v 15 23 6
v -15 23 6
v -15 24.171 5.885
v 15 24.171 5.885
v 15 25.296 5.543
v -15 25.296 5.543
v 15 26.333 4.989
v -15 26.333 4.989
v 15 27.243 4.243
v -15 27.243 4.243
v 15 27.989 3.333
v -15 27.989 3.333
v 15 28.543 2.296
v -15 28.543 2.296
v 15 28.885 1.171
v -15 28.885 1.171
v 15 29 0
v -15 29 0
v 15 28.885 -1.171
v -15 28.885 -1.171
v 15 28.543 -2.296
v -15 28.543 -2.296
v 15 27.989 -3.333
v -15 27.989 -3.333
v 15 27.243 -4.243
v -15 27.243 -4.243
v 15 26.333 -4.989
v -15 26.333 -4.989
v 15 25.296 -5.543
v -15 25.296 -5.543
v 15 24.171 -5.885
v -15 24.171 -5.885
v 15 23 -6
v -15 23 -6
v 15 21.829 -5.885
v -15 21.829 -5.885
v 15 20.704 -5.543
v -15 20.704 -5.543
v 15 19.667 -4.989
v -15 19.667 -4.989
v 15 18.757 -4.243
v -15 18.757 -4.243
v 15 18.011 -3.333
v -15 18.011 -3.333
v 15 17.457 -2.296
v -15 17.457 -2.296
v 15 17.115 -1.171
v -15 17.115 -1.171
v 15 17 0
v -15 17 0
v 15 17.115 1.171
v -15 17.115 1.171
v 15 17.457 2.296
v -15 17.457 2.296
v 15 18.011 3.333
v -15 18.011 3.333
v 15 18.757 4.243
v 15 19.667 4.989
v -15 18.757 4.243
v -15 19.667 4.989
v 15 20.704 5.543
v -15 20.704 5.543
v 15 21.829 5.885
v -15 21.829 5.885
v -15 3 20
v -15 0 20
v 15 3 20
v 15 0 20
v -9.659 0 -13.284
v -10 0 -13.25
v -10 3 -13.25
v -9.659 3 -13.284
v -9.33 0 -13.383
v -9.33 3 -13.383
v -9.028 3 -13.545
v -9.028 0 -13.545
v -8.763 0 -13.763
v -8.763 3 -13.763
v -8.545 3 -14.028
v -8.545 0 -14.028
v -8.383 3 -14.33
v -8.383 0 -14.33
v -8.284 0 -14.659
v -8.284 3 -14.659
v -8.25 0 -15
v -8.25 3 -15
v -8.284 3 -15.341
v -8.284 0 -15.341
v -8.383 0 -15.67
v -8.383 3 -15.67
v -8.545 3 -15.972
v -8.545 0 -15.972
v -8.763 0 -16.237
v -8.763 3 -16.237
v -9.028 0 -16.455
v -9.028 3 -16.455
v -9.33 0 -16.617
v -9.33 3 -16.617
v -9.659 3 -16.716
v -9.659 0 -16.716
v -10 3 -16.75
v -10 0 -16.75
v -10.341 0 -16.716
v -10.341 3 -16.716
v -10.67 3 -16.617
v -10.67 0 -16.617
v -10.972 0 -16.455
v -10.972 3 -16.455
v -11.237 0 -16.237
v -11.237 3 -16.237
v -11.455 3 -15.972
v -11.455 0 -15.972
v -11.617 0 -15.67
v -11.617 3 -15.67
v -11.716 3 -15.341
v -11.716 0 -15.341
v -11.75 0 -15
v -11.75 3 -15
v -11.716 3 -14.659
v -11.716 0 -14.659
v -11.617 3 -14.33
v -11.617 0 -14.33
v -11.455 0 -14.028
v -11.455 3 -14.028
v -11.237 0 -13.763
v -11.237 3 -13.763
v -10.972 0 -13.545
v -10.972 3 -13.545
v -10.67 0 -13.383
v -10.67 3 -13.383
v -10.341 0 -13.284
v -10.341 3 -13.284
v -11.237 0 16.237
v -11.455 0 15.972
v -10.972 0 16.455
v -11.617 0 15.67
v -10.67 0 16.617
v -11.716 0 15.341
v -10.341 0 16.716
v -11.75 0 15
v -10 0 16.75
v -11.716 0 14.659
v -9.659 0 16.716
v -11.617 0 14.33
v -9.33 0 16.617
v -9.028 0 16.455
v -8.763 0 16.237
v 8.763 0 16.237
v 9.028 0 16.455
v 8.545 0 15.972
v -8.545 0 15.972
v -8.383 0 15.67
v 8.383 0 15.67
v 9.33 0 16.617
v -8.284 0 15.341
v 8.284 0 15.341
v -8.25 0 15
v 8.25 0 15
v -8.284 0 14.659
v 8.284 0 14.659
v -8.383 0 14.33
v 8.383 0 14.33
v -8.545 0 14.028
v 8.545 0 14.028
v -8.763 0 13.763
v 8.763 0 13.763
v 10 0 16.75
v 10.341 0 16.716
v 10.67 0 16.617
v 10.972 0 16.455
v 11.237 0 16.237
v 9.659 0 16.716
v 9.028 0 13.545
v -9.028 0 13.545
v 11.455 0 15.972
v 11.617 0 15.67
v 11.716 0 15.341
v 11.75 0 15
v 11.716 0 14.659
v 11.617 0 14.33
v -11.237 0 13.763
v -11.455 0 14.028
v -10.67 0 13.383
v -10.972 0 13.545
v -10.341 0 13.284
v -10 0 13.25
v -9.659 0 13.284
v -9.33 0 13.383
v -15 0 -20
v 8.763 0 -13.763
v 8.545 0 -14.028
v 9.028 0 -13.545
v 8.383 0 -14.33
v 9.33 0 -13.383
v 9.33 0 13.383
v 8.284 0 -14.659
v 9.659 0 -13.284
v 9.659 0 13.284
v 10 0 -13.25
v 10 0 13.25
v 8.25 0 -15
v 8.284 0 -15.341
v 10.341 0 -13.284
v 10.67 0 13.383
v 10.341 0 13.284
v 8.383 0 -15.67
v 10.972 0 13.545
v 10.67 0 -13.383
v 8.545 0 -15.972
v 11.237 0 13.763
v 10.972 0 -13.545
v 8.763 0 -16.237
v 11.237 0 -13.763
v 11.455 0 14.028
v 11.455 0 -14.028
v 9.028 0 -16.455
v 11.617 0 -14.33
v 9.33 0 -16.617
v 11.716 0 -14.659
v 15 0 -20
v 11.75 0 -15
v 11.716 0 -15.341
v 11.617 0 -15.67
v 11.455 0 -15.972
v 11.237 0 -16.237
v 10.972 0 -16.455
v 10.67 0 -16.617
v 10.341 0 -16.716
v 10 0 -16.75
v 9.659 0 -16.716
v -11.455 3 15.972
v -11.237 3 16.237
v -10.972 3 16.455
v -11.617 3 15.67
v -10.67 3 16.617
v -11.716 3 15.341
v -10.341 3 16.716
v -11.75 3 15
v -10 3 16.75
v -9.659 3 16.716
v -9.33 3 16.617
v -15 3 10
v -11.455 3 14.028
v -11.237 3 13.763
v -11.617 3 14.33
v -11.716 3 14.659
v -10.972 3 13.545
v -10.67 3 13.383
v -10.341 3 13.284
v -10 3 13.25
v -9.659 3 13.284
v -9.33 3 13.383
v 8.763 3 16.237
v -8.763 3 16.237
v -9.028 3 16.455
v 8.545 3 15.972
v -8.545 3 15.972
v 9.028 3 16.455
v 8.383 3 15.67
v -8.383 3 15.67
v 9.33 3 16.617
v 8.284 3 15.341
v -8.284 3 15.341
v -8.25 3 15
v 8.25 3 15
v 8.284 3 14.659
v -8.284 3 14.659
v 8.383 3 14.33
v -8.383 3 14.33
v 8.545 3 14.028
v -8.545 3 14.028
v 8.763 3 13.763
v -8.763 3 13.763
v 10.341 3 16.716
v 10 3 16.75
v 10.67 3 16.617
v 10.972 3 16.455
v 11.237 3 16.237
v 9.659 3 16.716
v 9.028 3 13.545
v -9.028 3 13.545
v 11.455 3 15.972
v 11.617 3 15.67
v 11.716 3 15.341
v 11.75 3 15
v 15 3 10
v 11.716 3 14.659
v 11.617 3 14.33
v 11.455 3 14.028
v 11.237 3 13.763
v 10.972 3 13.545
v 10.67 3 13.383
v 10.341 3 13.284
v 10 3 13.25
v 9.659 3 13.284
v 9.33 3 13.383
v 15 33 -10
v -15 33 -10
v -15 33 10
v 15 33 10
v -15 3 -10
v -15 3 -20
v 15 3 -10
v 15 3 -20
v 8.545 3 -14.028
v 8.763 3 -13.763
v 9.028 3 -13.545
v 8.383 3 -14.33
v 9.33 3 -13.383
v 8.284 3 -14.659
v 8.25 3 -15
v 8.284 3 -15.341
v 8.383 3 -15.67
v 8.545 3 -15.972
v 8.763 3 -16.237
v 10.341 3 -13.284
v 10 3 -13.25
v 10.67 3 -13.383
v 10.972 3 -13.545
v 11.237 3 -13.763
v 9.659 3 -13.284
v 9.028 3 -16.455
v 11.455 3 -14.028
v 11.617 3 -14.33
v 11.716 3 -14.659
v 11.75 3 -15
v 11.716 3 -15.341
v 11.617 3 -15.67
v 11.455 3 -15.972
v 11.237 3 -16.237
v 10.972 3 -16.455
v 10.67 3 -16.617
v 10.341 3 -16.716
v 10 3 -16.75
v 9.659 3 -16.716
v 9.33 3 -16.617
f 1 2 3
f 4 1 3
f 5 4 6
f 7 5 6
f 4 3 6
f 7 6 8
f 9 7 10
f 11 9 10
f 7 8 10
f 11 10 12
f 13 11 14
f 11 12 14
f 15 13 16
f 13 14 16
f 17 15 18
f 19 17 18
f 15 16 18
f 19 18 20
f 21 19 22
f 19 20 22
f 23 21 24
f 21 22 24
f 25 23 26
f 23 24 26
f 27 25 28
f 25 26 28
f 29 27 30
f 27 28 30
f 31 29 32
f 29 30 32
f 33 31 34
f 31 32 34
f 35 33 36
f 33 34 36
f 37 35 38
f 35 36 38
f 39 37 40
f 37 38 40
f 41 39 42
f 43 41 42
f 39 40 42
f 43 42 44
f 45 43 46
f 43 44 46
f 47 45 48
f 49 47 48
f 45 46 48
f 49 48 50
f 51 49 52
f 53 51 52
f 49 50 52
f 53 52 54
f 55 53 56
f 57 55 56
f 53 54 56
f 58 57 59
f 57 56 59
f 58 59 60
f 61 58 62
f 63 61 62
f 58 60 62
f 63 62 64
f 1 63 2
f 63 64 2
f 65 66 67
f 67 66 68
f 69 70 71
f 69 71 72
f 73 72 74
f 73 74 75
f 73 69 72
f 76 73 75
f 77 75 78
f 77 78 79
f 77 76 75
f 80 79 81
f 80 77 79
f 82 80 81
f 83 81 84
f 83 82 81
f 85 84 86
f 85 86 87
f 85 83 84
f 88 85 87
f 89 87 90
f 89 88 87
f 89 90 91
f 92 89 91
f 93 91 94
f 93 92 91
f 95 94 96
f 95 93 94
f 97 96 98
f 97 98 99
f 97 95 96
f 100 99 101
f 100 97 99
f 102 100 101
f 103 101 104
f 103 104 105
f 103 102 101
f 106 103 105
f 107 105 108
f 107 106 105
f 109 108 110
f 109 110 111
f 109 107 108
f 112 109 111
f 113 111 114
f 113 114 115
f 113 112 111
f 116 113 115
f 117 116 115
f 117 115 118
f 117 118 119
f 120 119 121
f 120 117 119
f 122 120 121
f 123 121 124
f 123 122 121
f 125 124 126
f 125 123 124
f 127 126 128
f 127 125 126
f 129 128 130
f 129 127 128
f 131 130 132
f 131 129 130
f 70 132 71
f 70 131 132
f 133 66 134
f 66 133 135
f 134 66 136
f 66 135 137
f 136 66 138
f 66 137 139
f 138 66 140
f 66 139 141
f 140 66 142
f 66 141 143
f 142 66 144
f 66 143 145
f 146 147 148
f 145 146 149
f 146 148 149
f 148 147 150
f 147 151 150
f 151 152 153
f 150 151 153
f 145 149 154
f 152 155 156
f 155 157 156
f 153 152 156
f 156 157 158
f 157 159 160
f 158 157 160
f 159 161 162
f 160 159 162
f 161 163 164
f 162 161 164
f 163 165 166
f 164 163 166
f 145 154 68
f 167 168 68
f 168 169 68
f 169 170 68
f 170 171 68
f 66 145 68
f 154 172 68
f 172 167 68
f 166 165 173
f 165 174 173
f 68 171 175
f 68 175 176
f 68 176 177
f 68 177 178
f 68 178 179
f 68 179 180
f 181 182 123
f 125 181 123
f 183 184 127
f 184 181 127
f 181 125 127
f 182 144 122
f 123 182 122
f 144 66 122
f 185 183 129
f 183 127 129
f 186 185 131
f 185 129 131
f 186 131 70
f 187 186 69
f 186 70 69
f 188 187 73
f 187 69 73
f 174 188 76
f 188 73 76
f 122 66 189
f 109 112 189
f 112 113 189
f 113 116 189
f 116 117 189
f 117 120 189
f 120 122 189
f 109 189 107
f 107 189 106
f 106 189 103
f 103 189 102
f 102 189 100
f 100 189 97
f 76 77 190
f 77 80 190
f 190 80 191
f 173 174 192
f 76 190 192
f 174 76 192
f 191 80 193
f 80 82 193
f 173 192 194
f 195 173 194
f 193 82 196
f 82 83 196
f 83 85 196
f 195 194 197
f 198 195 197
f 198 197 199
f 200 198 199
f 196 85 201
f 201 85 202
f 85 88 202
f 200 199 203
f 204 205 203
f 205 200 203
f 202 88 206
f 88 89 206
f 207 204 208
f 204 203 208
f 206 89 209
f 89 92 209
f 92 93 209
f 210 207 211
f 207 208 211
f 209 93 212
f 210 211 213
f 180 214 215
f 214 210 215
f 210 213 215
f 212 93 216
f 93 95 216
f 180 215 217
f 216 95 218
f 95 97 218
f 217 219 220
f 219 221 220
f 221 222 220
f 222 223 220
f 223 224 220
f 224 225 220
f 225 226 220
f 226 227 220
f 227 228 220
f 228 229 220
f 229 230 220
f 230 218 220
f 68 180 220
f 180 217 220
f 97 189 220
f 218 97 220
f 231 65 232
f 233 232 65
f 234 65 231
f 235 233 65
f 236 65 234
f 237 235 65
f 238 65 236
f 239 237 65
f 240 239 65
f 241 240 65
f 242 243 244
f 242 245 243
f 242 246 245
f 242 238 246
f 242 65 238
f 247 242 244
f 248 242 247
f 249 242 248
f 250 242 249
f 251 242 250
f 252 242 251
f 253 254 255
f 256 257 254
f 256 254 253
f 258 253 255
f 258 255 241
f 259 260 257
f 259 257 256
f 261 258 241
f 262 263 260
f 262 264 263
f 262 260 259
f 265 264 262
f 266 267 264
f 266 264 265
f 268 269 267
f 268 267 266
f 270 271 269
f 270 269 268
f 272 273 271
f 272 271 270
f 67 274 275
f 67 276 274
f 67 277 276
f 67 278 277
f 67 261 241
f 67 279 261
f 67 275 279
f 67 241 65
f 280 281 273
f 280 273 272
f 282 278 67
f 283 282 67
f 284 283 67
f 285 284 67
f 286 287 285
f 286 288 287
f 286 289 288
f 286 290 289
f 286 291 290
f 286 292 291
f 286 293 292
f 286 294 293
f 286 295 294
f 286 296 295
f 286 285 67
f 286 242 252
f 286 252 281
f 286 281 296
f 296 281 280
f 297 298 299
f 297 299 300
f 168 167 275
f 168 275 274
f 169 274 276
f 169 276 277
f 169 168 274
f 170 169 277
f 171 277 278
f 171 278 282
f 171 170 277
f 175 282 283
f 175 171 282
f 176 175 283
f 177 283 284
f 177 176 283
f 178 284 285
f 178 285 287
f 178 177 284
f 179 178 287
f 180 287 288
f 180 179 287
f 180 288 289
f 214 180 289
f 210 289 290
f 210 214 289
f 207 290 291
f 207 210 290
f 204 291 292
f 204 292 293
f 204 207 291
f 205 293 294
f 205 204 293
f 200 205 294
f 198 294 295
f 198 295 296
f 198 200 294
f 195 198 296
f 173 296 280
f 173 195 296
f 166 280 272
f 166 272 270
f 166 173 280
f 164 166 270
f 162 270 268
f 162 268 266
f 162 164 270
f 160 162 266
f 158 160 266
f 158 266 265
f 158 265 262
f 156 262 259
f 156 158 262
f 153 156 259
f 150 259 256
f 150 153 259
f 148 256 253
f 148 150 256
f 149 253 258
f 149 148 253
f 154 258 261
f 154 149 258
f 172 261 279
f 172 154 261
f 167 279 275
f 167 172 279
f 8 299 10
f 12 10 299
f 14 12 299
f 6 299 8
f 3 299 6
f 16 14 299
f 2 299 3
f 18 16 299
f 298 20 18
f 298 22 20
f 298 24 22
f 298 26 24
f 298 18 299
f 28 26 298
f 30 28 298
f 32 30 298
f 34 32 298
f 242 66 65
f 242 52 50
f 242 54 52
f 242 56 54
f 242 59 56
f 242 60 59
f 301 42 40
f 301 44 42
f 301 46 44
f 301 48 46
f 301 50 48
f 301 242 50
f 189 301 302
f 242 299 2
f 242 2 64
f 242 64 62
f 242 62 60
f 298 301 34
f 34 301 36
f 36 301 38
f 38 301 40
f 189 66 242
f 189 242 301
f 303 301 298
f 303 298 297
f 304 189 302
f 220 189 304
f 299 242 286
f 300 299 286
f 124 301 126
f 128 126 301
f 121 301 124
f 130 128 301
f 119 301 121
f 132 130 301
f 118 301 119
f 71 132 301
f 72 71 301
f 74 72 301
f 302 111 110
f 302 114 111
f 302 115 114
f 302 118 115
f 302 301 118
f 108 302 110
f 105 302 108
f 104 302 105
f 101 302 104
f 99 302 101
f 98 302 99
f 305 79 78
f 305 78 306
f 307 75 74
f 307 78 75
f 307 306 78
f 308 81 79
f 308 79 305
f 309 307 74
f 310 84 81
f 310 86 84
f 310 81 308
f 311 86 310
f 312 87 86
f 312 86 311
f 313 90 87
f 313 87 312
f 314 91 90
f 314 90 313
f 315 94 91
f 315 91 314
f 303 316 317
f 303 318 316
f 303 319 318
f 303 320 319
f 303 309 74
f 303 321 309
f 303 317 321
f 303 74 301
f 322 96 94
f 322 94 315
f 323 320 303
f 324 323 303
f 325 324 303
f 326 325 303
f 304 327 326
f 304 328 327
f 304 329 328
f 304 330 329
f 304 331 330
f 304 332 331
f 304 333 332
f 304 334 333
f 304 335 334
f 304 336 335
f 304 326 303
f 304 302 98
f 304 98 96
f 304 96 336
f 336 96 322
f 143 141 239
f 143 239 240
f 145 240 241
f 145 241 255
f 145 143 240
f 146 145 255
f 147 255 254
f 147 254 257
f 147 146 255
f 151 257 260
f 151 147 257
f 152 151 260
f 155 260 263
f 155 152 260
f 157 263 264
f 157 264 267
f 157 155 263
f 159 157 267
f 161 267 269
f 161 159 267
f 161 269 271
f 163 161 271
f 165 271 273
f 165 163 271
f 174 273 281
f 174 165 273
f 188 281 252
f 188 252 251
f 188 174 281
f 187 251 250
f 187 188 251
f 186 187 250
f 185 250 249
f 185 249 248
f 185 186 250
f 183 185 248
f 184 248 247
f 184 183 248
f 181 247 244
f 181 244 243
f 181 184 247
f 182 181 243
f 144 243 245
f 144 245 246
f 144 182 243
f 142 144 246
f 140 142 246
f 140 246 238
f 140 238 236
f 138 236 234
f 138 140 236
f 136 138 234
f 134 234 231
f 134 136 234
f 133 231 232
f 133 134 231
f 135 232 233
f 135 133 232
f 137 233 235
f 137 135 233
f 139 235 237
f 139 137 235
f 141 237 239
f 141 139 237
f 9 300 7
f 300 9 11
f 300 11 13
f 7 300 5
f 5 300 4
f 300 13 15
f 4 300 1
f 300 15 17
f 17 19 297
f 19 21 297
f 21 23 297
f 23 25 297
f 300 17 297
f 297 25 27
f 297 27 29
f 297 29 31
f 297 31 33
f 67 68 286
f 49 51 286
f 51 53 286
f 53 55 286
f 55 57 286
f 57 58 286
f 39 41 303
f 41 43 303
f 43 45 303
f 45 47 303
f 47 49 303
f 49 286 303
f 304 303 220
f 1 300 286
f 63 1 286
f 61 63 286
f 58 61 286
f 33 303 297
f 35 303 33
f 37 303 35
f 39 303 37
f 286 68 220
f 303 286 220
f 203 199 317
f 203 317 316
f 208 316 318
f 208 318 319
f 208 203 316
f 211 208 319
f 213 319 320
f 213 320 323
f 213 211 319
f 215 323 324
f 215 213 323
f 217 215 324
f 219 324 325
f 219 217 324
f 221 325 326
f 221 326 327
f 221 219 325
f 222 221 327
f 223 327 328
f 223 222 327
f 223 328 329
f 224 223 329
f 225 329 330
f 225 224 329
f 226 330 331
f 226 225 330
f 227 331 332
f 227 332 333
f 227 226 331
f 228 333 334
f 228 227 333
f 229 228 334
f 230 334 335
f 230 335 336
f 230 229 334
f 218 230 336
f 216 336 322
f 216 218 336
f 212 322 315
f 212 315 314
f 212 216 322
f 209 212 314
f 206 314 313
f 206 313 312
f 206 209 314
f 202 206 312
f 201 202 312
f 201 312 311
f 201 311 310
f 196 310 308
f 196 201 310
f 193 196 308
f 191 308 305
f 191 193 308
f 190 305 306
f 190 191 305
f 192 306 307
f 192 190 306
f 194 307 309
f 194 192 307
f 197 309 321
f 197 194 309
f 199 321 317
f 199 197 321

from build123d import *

# Parameters (mm, degrees)
SKETCH1_W           = 30
SKETCH1_H           = 40
SKETCH1_R           = 1.75
BOSS_EXTRUDE2_DEPTH = 3
SKETCH2_W           = 30
SKETCH2_H           = 20
BOSS_EXTRUDE3_DEPTH = 30
SKETCH3_R           = 6
CUT_EXTRUDE1_DEPTH  = 30


with BuildPart() as part:
    # Sketch1 → Boss-Extrude2 (new body)
    with BuildSketch(Plane(origin=(0, 0, 0), x_dir=(1, 0, 0), z_dir=(0, 1, 0))):
        Rectangle(SKETCH1_W, SKETCH1_H)
        with Locations(Location((-10, 15, 0), (0, 0, 270))):
            Circle(SKETCH1_R, mode=Mode.SUBTRACT)
        with Locations(Location((10, 15, 0), (0, 0, 270))):
            Circle(SKETCH1_R, mode=Mode.SUBTRACT)
        with Locations(Location((10, -15, 0), (0, 0, 270))):
            Circle(SKETCH1_R, mode=Mode.SUBTRACT)
        with Locations(Location((-10, -15, 0), (0, 0, 270))):
            Circle(SKETCH1_R, mode=Mode.SUBTRACT)
    extrude(amount=BOSS_EXTRUDE2_DEPTH)

    # Sketch2 → Boss-Extrude3 (add)
    with BuildSketch(Plane(origin=(0, 3, 0), x_dir=(1, 0, 0), z_dir=(0, 1, 0))):
        Rectangle(SKETCH2_W, SKETCH2_H)
    extrude(amount=BOSS_EXTRUDE3_DEPTH)

    # Sketch3 → Cut-Extrude1 (cut)
    with BuildSketch(Plane.ZY.offset(15)):
        with Locations((0, 23)):
            Circle(SKETCH3_R)
    extrude(amount=-CUT_EXTRUDE1_DEPTH, mode=Mode.SUBTRACT)


solid = part.part
